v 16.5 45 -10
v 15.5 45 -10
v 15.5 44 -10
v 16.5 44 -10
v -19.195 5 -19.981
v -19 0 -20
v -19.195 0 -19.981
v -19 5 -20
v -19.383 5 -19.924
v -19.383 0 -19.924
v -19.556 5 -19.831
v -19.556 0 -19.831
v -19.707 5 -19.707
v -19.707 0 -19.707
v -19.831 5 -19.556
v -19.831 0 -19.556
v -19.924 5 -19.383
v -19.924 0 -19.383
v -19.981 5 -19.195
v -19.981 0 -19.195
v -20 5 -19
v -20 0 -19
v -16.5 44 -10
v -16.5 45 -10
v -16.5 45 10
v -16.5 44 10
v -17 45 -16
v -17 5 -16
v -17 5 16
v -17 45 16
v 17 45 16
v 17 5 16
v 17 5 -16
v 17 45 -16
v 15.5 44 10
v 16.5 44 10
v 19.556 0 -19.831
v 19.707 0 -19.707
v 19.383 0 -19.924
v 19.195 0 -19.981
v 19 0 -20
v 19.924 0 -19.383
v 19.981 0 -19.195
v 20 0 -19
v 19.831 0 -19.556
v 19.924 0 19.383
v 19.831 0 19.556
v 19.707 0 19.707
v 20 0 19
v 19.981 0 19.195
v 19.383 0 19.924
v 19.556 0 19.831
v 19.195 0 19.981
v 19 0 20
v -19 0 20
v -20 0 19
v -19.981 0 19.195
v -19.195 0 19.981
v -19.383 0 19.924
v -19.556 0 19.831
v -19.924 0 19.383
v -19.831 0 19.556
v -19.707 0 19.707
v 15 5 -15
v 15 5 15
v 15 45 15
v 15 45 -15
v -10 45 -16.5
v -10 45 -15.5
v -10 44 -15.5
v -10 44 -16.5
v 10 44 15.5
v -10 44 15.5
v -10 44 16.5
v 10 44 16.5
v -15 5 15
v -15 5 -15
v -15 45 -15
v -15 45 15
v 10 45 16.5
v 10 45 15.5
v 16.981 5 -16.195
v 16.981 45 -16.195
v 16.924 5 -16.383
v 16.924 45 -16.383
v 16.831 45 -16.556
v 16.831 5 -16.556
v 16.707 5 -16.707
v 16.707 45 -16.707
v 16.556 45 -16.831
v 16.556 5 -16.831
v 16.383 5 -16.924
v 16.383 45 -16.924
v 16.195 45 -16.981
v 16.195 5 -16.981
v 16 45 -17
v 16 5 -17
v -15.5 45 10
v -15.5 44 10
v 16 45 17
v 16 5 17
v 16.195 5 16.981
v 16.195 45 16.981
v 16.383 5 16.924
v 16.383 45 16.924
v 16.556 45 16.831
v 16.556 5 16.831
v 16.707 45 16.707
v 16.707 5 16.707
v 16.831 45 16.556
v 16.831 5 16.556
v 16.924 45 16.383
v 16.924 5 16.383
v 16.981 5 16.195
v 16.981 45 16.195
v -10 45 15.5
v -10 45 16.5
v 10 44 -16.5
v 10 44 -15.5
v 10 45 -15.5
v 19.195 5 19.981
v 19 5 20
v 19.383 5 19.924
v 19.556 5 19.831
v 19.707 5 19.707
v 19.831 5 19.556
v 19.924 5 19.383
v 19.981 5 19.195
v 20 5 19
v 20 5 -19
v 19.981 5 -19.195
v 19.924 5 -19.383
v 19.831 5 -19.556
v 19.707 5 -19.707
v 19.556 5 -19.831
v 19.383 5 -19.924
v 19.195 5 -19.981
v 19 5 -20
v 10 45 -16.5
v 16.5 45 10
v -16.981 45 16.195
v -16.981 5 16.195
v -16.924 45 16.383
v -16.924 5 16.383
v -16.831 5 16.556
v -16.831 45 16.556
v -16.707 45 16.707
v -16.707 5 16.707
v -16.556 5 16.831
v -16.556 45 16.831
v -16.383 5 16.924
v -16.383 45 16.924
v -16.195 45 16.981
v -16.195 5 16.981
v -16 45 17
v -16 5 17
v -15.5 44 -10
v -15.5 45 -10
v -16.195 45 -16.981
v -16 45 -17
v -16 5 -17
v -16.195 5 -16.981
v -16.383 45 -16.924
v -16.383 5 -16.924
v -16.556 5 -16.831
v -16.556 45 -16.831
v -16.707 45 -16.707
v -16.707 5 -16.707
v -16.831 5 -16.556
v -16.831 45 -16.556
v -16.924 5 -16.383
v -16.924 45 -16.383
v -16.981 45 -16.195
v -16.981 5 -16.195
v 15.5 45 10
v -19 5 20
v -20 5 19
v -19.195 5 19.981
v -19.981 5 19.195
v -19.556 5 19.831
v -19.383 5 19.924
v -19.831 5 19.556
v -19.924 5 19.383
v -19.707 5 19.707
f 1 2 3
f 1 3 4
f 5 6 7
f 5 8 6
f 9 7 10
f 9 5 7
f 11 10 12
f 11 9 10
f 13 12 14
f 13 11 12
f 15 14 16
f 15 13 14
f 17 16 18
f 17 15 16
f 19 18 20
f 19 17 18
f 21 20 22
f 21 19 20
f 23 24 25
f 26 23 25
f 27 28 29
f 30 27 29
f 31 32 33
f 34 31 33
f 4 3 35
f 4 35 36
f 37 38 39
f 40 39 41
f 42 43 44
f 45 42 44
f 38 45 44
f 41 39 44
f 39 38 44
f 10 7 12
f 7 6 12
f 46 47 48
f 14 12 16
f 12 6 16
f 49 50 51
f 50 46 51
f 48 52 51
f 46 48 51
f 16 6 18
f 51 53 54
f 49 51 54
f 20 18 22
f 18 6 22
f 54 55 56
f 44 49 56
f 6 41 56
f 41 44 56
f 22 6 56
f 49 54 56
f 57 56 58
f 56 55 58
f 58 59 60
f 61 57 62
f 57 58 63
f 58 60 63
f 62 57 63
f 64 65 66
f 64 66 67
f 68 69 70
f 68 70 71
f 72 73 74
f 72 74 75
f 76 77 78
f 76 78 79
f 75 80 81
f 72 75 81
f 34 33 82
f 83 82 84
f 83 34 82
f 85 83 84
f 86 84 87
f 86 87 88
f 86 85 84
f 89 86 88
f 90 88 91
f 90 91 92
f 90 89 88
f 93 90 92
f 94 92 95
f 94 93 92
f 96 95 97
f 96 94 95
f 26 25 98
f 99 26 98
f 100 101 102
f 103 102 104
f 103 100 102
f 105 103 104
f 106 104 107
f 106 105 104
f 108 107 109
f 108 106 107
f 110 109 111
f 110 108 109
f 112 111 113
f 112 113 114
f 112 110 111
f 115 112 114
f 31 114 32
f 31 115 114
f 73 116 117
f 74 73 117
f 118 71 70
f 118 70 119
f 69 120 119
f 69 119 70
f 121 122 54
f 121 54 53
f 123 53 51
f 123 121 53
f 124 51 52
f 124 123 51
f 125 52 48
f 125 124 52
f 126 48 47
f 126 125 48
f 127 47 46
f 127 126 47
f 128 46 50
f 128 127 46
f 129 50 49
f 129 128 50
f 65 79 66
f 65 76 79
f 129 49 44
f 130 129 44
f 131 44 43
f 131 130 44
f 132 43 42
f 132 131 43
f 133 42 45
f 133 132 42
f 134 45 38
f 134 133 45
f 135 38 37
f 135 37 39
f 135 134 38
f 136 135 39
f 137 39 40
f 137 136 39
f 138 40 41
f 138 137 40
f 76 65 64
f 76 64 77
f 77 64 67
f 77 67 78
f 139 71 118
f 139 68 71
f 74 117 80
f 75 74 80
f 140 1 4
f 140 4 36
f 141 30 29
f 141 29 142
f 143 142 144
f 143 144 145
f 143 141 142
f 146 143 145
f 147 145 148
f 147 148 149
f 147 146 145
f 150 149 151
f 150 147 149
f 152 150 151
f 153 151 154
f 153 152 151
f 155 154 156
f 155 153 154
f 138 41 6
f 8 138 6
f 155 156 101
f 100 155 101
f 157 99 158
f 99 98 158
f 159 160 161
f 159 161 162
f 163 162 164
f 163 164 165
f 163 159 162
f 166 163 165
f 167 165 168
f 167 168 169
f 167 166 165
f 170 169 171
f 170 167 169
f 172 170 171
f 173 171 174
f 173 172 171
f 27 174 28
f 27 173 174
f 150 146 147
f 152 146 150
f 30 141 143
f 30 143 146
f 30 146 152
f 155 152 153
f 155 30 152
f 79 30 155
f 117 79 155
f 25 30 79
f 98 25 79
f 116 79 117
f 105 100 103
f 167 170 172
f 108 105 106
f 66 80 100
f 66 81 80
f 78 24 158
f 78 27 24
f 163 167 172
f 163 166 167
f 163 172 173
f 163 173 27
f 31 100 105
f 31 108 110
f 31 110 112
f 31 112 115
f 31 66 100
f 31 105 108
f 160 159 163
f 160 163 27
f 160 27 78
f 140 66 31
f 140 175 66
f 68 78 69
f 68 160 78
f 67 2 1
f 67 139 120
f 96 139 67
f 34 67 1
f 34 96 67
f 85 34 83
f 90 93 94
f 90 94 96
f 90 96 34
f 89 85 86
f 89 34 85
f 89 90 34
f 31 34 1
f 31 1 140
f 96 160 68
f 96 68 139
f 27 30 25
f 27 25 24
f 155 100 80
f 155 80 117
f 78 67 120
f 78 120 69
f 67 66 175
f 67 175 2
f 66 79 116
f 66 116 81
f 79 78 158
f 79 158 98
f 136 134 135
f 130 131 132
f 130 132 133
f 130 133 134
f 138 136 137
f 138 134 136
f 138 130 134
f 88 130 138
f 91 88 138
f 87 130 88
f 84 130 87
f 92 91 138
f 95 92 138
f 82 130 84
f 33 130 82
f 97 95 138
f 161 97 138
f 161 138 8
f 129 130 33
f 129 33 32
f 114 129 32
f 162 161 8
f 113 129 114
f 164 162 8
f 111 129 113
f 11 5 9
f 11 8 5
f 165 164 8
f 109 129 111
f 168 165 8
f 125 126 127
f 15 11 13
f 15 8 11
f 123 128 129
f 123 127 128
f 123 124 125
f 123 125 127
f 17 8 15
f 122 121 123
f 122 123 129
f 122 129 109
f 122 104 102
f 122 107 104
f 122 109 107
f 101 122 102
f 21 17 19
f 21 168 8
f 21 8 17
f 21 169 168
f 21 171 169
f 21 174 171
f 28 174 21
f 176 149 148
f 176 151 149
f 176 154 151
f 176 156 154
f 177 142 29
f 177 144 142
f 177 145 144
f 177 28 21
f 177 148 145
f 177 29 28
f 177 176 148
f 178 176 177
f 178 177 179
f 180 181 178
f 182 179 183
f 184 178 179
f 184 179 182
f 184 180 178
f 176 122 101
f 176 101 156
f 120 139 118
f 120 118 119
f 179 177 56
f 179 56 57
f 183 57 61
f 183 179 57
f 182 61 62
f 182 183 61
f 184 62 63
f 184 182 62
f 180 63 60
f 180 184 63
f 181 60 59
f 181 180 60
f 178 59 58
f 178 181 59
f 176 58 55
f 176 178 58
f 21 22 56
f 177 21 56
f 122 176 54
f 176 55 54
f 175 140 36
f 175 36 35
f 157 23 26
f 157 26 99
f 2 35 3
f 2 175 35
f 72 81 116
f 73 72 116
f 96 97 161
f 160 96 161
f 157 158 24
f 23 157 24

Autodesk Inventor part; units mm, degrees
ref_plane "YZ Plane" through (0, 0, 0) normal (1, 0, 0) x (0, 1, 0)
ref_plane "XZ Plane" through (0, 0, 0) normal (0, 1, 0) x (-1, 0, 0)
ref_plane "XY Plane" through (0, 0, 0) normal (0, 0, 1) x (1, 0, 0)
sketch "Sketch1" plane through (0, 0, 0) normal (0, 1, 0) x (-1, 0, 0)
  line L0 (-20, -20) -> (20, -20)
  line L1 (20, -20) -> (20, 20)
  line L2 (20, 20) -> (-20, 20)
  line L3 (-20, 20) -> (-20, -20)
  line L4 (-20, -20) -> (20, 20) construction
  line L5 (20, -20) -> (-20, 20) construction
  point P0 (0, 0)
  dimension "d2" = 40
  dimension "d3" = 40
extrude "Extrusion1" add sketch "Sketch1" along normal blind 5
sketch "Sketch2" plane through (0, 5, 0) normal (0, 1, 0) x (1, 0, 0)
  line L0 (-20, 20) -> (-20, -20) projected
  line L1 (-20, -20) -> (20, -20) projected
  line L2 (20, -20) -> (20, 20) projected
  line L3 (20, 20) -> (-20, 20) projected
  line L4 (17, 17) -> (-17, 17)
  line L5 (-17, 17) -> (-17, -17)
  line L6 (-17, -17) -> (17, -17)
  line L7 (17, -17) -> (17, 17)
  line L8 (17, 17) -> (-17, -17) construction
  line L9 (-17, 17) -> (17, -17) construction
  line L10 (15, 15) -> (-15, 15)
  line L11 (-15, 15) -> (-15, -15)
  line L12 (-15, -15) -> (15, -15)
  line L13 (15, -15) -> (15, 15)
  line L14 (15, 15) -> (-15, -15) construction
  line L15 (-15, 15) -> (15, -15) construction
  point P0 (0, 0)
  dimension "d6" = 3
  dimension "d7" = 2
  dimension "d52" = 3
  dimension "d53" = 2
extrude "Extrusion2" add sketch "Sketch2" along normal blind 40 contours L7 L6 L5 L4
fillet "Fillet1" radius 1 1 edges at (20, 2.5, 20)
fillet "Fillet2" radius 1 1 edges at (20, 2.5, -20)
fillet "Fillet3" radius 1 1 edges at (-20, 2.5, 20)
fillet "Fillet4" radius 1 1 edges at (-20, 2.5, -20)
fillet "Fillet5" radius 1 1 edges at (-17, 25, 17)
fillet "Fillet6" radius 1 1 edges at (17, 25, 17)
fillet "Fillet7" radius 1 1 edges at (17, 25, -17)
fillet "Fillet8" radius 1 1 edges at (-17, 25, -17)
sketch "Sketch3" plane through (0, 45, 0) normal (0, 1, 0) x (1, 0, 0)
  arc A0 (-16, 17) -> (-17, 16) centre (-16, 16) ccw projected
  line L0 (-17, 16) -> (-17, -16) projected
  arc A1 (-17, -16) -> (-16, -17) centre (-16, -16) ccw projected
  line L1 (-16, -17) -> (16, -17) projected
  arc A2 (16, -17) -> (17, -16) centre (16, -16) ccw projected
  line L2 (17, -16) -> (17, 16) projected
  arc A3 (17, 16) -> (16, 17) centre (16, 16) ccw projected
  line L3 (16, 17) -> (-16, 17) projected
  line L4 (15, 15) -> (15, -15) projected
  line L5 (15, -15) -> (-15, -15) projected
  line L6 (-15, -15) -> (-15, 15) projected
  line L7 (-15, 15) -> (15, 15) projected
  line L8 (-16.5, -10) -> (-15.5, -10)
  line L9 (-15.5, -10) -> (-15.5, 10)
  line L10 (-15.5, 10) -> (-16.5, 10)
  line L11 (-16.5, 10) -> (-16.5, -10)
  line L12 (-16.5, 10) -> (-15.5, 10)
  line L13 (-15.5, 10) -> (-15.5, -10)
  line L14 (-15.5, -10) -> (-16.5, -10)
  line L15 (-16.5, -10) -> (-16.5, 10)
  line L16 (-10, 16.5) -> (10, 16.5)
  line L17 (10, 16.5) -> (10, 15.5)
  line L18 (10, 15.5) -> (-10, 15.5)
  line L19 (-10, 15.5) -> (-10, 16.5)
  line L20 (10, 16.5) -> (-10, 16.5)
  line L21 (-10, 16.5) -> (-10, 15.5)
  line L22 (-10, 15.5) -> (10, 15.5)
  line L23 (10, 15.5) -> (10, 16.5)
  line L24 (15.5, 10) -> (16.5, 10)
  line L25 (16.5, 10) -> (16.5, -10)
  line L26 (16.5, -10) -> (15.5, -10)
  line L27 (15.5, -10) -> (15.5, 10)
  line L28 (15.5, -10) -> (16.5, -10)
  line L29 (16.5, -10) -> (16.5, 10)
  line L30 (16.5, 10) -> (15.5, 10)
  line L31 (15.5, 10) -> (15.5, -10)
  line L32 (10, -15.5) -> (-10, -15.5)
  line L33 (-10, -15.5) -> (-10, -16.5)
  line L34 (-10, -16.5) -> (10, -16.5)
  line L35 (10, -16.5) -> (10, -15.5)
  line L36 (-10, -15.5) -> (10, -15.5)
  line L37 (10, -15.5) -> (10, -16.5)
  line L38 (10, -16.5) -> (-10, -16.5)
  line L39 (-10, -16.5) -> (-10, -15.5)
  point P0 (0, 0)
  point P1 (-16, 10)
  point P2 (-16, -10)
  point P3 (16, 10)
  dimension "d18" = 1
  dimension "d19" = 20
  dimension "d20" = 0.5
  dimension "d21" = 7
  dimension "d22" = 7
  dimension "d23" = 0.5
  dimension "d24" = 1
  dimension "d25" = 20
  dimension "d26" = 20
  dimension "d27" = 1
  dimension "d28" = 0.5
  dimension "d29" = 7
  dimension "d30" = 20
  dimension "d31" = 1
  dimension "d32" = 0.5
  dimension "d33" = 7
  dimension "d34" = 1
  dimension "d35" = 20
  dimension "d36" = 0.5
  dimension "d37" = 7
  dimension "d38" = 1
  dimension "d39" = 20
  dimension "d40" = 7
  dimension "d41" = 0.5
  dimension "d42" = 20
  dimension "d43" = 1
  dimension "d44" = 0.5
  dimension "d45" = 7
  dimension "d46" = 20
  dimension "d47" = 1
  dimension "d48" = 0.5
  dimension "d49" = 7
extrude "Extrusion3" cut sketch "Sketch3" against normal blind 1 contours L11 L10 L9 L8 | L16 L17 L18 L19 | L24 L25 L26 L27 | L35 L34 L33 L32
properties part number "block_main" material "PC/ABS Plastic"
